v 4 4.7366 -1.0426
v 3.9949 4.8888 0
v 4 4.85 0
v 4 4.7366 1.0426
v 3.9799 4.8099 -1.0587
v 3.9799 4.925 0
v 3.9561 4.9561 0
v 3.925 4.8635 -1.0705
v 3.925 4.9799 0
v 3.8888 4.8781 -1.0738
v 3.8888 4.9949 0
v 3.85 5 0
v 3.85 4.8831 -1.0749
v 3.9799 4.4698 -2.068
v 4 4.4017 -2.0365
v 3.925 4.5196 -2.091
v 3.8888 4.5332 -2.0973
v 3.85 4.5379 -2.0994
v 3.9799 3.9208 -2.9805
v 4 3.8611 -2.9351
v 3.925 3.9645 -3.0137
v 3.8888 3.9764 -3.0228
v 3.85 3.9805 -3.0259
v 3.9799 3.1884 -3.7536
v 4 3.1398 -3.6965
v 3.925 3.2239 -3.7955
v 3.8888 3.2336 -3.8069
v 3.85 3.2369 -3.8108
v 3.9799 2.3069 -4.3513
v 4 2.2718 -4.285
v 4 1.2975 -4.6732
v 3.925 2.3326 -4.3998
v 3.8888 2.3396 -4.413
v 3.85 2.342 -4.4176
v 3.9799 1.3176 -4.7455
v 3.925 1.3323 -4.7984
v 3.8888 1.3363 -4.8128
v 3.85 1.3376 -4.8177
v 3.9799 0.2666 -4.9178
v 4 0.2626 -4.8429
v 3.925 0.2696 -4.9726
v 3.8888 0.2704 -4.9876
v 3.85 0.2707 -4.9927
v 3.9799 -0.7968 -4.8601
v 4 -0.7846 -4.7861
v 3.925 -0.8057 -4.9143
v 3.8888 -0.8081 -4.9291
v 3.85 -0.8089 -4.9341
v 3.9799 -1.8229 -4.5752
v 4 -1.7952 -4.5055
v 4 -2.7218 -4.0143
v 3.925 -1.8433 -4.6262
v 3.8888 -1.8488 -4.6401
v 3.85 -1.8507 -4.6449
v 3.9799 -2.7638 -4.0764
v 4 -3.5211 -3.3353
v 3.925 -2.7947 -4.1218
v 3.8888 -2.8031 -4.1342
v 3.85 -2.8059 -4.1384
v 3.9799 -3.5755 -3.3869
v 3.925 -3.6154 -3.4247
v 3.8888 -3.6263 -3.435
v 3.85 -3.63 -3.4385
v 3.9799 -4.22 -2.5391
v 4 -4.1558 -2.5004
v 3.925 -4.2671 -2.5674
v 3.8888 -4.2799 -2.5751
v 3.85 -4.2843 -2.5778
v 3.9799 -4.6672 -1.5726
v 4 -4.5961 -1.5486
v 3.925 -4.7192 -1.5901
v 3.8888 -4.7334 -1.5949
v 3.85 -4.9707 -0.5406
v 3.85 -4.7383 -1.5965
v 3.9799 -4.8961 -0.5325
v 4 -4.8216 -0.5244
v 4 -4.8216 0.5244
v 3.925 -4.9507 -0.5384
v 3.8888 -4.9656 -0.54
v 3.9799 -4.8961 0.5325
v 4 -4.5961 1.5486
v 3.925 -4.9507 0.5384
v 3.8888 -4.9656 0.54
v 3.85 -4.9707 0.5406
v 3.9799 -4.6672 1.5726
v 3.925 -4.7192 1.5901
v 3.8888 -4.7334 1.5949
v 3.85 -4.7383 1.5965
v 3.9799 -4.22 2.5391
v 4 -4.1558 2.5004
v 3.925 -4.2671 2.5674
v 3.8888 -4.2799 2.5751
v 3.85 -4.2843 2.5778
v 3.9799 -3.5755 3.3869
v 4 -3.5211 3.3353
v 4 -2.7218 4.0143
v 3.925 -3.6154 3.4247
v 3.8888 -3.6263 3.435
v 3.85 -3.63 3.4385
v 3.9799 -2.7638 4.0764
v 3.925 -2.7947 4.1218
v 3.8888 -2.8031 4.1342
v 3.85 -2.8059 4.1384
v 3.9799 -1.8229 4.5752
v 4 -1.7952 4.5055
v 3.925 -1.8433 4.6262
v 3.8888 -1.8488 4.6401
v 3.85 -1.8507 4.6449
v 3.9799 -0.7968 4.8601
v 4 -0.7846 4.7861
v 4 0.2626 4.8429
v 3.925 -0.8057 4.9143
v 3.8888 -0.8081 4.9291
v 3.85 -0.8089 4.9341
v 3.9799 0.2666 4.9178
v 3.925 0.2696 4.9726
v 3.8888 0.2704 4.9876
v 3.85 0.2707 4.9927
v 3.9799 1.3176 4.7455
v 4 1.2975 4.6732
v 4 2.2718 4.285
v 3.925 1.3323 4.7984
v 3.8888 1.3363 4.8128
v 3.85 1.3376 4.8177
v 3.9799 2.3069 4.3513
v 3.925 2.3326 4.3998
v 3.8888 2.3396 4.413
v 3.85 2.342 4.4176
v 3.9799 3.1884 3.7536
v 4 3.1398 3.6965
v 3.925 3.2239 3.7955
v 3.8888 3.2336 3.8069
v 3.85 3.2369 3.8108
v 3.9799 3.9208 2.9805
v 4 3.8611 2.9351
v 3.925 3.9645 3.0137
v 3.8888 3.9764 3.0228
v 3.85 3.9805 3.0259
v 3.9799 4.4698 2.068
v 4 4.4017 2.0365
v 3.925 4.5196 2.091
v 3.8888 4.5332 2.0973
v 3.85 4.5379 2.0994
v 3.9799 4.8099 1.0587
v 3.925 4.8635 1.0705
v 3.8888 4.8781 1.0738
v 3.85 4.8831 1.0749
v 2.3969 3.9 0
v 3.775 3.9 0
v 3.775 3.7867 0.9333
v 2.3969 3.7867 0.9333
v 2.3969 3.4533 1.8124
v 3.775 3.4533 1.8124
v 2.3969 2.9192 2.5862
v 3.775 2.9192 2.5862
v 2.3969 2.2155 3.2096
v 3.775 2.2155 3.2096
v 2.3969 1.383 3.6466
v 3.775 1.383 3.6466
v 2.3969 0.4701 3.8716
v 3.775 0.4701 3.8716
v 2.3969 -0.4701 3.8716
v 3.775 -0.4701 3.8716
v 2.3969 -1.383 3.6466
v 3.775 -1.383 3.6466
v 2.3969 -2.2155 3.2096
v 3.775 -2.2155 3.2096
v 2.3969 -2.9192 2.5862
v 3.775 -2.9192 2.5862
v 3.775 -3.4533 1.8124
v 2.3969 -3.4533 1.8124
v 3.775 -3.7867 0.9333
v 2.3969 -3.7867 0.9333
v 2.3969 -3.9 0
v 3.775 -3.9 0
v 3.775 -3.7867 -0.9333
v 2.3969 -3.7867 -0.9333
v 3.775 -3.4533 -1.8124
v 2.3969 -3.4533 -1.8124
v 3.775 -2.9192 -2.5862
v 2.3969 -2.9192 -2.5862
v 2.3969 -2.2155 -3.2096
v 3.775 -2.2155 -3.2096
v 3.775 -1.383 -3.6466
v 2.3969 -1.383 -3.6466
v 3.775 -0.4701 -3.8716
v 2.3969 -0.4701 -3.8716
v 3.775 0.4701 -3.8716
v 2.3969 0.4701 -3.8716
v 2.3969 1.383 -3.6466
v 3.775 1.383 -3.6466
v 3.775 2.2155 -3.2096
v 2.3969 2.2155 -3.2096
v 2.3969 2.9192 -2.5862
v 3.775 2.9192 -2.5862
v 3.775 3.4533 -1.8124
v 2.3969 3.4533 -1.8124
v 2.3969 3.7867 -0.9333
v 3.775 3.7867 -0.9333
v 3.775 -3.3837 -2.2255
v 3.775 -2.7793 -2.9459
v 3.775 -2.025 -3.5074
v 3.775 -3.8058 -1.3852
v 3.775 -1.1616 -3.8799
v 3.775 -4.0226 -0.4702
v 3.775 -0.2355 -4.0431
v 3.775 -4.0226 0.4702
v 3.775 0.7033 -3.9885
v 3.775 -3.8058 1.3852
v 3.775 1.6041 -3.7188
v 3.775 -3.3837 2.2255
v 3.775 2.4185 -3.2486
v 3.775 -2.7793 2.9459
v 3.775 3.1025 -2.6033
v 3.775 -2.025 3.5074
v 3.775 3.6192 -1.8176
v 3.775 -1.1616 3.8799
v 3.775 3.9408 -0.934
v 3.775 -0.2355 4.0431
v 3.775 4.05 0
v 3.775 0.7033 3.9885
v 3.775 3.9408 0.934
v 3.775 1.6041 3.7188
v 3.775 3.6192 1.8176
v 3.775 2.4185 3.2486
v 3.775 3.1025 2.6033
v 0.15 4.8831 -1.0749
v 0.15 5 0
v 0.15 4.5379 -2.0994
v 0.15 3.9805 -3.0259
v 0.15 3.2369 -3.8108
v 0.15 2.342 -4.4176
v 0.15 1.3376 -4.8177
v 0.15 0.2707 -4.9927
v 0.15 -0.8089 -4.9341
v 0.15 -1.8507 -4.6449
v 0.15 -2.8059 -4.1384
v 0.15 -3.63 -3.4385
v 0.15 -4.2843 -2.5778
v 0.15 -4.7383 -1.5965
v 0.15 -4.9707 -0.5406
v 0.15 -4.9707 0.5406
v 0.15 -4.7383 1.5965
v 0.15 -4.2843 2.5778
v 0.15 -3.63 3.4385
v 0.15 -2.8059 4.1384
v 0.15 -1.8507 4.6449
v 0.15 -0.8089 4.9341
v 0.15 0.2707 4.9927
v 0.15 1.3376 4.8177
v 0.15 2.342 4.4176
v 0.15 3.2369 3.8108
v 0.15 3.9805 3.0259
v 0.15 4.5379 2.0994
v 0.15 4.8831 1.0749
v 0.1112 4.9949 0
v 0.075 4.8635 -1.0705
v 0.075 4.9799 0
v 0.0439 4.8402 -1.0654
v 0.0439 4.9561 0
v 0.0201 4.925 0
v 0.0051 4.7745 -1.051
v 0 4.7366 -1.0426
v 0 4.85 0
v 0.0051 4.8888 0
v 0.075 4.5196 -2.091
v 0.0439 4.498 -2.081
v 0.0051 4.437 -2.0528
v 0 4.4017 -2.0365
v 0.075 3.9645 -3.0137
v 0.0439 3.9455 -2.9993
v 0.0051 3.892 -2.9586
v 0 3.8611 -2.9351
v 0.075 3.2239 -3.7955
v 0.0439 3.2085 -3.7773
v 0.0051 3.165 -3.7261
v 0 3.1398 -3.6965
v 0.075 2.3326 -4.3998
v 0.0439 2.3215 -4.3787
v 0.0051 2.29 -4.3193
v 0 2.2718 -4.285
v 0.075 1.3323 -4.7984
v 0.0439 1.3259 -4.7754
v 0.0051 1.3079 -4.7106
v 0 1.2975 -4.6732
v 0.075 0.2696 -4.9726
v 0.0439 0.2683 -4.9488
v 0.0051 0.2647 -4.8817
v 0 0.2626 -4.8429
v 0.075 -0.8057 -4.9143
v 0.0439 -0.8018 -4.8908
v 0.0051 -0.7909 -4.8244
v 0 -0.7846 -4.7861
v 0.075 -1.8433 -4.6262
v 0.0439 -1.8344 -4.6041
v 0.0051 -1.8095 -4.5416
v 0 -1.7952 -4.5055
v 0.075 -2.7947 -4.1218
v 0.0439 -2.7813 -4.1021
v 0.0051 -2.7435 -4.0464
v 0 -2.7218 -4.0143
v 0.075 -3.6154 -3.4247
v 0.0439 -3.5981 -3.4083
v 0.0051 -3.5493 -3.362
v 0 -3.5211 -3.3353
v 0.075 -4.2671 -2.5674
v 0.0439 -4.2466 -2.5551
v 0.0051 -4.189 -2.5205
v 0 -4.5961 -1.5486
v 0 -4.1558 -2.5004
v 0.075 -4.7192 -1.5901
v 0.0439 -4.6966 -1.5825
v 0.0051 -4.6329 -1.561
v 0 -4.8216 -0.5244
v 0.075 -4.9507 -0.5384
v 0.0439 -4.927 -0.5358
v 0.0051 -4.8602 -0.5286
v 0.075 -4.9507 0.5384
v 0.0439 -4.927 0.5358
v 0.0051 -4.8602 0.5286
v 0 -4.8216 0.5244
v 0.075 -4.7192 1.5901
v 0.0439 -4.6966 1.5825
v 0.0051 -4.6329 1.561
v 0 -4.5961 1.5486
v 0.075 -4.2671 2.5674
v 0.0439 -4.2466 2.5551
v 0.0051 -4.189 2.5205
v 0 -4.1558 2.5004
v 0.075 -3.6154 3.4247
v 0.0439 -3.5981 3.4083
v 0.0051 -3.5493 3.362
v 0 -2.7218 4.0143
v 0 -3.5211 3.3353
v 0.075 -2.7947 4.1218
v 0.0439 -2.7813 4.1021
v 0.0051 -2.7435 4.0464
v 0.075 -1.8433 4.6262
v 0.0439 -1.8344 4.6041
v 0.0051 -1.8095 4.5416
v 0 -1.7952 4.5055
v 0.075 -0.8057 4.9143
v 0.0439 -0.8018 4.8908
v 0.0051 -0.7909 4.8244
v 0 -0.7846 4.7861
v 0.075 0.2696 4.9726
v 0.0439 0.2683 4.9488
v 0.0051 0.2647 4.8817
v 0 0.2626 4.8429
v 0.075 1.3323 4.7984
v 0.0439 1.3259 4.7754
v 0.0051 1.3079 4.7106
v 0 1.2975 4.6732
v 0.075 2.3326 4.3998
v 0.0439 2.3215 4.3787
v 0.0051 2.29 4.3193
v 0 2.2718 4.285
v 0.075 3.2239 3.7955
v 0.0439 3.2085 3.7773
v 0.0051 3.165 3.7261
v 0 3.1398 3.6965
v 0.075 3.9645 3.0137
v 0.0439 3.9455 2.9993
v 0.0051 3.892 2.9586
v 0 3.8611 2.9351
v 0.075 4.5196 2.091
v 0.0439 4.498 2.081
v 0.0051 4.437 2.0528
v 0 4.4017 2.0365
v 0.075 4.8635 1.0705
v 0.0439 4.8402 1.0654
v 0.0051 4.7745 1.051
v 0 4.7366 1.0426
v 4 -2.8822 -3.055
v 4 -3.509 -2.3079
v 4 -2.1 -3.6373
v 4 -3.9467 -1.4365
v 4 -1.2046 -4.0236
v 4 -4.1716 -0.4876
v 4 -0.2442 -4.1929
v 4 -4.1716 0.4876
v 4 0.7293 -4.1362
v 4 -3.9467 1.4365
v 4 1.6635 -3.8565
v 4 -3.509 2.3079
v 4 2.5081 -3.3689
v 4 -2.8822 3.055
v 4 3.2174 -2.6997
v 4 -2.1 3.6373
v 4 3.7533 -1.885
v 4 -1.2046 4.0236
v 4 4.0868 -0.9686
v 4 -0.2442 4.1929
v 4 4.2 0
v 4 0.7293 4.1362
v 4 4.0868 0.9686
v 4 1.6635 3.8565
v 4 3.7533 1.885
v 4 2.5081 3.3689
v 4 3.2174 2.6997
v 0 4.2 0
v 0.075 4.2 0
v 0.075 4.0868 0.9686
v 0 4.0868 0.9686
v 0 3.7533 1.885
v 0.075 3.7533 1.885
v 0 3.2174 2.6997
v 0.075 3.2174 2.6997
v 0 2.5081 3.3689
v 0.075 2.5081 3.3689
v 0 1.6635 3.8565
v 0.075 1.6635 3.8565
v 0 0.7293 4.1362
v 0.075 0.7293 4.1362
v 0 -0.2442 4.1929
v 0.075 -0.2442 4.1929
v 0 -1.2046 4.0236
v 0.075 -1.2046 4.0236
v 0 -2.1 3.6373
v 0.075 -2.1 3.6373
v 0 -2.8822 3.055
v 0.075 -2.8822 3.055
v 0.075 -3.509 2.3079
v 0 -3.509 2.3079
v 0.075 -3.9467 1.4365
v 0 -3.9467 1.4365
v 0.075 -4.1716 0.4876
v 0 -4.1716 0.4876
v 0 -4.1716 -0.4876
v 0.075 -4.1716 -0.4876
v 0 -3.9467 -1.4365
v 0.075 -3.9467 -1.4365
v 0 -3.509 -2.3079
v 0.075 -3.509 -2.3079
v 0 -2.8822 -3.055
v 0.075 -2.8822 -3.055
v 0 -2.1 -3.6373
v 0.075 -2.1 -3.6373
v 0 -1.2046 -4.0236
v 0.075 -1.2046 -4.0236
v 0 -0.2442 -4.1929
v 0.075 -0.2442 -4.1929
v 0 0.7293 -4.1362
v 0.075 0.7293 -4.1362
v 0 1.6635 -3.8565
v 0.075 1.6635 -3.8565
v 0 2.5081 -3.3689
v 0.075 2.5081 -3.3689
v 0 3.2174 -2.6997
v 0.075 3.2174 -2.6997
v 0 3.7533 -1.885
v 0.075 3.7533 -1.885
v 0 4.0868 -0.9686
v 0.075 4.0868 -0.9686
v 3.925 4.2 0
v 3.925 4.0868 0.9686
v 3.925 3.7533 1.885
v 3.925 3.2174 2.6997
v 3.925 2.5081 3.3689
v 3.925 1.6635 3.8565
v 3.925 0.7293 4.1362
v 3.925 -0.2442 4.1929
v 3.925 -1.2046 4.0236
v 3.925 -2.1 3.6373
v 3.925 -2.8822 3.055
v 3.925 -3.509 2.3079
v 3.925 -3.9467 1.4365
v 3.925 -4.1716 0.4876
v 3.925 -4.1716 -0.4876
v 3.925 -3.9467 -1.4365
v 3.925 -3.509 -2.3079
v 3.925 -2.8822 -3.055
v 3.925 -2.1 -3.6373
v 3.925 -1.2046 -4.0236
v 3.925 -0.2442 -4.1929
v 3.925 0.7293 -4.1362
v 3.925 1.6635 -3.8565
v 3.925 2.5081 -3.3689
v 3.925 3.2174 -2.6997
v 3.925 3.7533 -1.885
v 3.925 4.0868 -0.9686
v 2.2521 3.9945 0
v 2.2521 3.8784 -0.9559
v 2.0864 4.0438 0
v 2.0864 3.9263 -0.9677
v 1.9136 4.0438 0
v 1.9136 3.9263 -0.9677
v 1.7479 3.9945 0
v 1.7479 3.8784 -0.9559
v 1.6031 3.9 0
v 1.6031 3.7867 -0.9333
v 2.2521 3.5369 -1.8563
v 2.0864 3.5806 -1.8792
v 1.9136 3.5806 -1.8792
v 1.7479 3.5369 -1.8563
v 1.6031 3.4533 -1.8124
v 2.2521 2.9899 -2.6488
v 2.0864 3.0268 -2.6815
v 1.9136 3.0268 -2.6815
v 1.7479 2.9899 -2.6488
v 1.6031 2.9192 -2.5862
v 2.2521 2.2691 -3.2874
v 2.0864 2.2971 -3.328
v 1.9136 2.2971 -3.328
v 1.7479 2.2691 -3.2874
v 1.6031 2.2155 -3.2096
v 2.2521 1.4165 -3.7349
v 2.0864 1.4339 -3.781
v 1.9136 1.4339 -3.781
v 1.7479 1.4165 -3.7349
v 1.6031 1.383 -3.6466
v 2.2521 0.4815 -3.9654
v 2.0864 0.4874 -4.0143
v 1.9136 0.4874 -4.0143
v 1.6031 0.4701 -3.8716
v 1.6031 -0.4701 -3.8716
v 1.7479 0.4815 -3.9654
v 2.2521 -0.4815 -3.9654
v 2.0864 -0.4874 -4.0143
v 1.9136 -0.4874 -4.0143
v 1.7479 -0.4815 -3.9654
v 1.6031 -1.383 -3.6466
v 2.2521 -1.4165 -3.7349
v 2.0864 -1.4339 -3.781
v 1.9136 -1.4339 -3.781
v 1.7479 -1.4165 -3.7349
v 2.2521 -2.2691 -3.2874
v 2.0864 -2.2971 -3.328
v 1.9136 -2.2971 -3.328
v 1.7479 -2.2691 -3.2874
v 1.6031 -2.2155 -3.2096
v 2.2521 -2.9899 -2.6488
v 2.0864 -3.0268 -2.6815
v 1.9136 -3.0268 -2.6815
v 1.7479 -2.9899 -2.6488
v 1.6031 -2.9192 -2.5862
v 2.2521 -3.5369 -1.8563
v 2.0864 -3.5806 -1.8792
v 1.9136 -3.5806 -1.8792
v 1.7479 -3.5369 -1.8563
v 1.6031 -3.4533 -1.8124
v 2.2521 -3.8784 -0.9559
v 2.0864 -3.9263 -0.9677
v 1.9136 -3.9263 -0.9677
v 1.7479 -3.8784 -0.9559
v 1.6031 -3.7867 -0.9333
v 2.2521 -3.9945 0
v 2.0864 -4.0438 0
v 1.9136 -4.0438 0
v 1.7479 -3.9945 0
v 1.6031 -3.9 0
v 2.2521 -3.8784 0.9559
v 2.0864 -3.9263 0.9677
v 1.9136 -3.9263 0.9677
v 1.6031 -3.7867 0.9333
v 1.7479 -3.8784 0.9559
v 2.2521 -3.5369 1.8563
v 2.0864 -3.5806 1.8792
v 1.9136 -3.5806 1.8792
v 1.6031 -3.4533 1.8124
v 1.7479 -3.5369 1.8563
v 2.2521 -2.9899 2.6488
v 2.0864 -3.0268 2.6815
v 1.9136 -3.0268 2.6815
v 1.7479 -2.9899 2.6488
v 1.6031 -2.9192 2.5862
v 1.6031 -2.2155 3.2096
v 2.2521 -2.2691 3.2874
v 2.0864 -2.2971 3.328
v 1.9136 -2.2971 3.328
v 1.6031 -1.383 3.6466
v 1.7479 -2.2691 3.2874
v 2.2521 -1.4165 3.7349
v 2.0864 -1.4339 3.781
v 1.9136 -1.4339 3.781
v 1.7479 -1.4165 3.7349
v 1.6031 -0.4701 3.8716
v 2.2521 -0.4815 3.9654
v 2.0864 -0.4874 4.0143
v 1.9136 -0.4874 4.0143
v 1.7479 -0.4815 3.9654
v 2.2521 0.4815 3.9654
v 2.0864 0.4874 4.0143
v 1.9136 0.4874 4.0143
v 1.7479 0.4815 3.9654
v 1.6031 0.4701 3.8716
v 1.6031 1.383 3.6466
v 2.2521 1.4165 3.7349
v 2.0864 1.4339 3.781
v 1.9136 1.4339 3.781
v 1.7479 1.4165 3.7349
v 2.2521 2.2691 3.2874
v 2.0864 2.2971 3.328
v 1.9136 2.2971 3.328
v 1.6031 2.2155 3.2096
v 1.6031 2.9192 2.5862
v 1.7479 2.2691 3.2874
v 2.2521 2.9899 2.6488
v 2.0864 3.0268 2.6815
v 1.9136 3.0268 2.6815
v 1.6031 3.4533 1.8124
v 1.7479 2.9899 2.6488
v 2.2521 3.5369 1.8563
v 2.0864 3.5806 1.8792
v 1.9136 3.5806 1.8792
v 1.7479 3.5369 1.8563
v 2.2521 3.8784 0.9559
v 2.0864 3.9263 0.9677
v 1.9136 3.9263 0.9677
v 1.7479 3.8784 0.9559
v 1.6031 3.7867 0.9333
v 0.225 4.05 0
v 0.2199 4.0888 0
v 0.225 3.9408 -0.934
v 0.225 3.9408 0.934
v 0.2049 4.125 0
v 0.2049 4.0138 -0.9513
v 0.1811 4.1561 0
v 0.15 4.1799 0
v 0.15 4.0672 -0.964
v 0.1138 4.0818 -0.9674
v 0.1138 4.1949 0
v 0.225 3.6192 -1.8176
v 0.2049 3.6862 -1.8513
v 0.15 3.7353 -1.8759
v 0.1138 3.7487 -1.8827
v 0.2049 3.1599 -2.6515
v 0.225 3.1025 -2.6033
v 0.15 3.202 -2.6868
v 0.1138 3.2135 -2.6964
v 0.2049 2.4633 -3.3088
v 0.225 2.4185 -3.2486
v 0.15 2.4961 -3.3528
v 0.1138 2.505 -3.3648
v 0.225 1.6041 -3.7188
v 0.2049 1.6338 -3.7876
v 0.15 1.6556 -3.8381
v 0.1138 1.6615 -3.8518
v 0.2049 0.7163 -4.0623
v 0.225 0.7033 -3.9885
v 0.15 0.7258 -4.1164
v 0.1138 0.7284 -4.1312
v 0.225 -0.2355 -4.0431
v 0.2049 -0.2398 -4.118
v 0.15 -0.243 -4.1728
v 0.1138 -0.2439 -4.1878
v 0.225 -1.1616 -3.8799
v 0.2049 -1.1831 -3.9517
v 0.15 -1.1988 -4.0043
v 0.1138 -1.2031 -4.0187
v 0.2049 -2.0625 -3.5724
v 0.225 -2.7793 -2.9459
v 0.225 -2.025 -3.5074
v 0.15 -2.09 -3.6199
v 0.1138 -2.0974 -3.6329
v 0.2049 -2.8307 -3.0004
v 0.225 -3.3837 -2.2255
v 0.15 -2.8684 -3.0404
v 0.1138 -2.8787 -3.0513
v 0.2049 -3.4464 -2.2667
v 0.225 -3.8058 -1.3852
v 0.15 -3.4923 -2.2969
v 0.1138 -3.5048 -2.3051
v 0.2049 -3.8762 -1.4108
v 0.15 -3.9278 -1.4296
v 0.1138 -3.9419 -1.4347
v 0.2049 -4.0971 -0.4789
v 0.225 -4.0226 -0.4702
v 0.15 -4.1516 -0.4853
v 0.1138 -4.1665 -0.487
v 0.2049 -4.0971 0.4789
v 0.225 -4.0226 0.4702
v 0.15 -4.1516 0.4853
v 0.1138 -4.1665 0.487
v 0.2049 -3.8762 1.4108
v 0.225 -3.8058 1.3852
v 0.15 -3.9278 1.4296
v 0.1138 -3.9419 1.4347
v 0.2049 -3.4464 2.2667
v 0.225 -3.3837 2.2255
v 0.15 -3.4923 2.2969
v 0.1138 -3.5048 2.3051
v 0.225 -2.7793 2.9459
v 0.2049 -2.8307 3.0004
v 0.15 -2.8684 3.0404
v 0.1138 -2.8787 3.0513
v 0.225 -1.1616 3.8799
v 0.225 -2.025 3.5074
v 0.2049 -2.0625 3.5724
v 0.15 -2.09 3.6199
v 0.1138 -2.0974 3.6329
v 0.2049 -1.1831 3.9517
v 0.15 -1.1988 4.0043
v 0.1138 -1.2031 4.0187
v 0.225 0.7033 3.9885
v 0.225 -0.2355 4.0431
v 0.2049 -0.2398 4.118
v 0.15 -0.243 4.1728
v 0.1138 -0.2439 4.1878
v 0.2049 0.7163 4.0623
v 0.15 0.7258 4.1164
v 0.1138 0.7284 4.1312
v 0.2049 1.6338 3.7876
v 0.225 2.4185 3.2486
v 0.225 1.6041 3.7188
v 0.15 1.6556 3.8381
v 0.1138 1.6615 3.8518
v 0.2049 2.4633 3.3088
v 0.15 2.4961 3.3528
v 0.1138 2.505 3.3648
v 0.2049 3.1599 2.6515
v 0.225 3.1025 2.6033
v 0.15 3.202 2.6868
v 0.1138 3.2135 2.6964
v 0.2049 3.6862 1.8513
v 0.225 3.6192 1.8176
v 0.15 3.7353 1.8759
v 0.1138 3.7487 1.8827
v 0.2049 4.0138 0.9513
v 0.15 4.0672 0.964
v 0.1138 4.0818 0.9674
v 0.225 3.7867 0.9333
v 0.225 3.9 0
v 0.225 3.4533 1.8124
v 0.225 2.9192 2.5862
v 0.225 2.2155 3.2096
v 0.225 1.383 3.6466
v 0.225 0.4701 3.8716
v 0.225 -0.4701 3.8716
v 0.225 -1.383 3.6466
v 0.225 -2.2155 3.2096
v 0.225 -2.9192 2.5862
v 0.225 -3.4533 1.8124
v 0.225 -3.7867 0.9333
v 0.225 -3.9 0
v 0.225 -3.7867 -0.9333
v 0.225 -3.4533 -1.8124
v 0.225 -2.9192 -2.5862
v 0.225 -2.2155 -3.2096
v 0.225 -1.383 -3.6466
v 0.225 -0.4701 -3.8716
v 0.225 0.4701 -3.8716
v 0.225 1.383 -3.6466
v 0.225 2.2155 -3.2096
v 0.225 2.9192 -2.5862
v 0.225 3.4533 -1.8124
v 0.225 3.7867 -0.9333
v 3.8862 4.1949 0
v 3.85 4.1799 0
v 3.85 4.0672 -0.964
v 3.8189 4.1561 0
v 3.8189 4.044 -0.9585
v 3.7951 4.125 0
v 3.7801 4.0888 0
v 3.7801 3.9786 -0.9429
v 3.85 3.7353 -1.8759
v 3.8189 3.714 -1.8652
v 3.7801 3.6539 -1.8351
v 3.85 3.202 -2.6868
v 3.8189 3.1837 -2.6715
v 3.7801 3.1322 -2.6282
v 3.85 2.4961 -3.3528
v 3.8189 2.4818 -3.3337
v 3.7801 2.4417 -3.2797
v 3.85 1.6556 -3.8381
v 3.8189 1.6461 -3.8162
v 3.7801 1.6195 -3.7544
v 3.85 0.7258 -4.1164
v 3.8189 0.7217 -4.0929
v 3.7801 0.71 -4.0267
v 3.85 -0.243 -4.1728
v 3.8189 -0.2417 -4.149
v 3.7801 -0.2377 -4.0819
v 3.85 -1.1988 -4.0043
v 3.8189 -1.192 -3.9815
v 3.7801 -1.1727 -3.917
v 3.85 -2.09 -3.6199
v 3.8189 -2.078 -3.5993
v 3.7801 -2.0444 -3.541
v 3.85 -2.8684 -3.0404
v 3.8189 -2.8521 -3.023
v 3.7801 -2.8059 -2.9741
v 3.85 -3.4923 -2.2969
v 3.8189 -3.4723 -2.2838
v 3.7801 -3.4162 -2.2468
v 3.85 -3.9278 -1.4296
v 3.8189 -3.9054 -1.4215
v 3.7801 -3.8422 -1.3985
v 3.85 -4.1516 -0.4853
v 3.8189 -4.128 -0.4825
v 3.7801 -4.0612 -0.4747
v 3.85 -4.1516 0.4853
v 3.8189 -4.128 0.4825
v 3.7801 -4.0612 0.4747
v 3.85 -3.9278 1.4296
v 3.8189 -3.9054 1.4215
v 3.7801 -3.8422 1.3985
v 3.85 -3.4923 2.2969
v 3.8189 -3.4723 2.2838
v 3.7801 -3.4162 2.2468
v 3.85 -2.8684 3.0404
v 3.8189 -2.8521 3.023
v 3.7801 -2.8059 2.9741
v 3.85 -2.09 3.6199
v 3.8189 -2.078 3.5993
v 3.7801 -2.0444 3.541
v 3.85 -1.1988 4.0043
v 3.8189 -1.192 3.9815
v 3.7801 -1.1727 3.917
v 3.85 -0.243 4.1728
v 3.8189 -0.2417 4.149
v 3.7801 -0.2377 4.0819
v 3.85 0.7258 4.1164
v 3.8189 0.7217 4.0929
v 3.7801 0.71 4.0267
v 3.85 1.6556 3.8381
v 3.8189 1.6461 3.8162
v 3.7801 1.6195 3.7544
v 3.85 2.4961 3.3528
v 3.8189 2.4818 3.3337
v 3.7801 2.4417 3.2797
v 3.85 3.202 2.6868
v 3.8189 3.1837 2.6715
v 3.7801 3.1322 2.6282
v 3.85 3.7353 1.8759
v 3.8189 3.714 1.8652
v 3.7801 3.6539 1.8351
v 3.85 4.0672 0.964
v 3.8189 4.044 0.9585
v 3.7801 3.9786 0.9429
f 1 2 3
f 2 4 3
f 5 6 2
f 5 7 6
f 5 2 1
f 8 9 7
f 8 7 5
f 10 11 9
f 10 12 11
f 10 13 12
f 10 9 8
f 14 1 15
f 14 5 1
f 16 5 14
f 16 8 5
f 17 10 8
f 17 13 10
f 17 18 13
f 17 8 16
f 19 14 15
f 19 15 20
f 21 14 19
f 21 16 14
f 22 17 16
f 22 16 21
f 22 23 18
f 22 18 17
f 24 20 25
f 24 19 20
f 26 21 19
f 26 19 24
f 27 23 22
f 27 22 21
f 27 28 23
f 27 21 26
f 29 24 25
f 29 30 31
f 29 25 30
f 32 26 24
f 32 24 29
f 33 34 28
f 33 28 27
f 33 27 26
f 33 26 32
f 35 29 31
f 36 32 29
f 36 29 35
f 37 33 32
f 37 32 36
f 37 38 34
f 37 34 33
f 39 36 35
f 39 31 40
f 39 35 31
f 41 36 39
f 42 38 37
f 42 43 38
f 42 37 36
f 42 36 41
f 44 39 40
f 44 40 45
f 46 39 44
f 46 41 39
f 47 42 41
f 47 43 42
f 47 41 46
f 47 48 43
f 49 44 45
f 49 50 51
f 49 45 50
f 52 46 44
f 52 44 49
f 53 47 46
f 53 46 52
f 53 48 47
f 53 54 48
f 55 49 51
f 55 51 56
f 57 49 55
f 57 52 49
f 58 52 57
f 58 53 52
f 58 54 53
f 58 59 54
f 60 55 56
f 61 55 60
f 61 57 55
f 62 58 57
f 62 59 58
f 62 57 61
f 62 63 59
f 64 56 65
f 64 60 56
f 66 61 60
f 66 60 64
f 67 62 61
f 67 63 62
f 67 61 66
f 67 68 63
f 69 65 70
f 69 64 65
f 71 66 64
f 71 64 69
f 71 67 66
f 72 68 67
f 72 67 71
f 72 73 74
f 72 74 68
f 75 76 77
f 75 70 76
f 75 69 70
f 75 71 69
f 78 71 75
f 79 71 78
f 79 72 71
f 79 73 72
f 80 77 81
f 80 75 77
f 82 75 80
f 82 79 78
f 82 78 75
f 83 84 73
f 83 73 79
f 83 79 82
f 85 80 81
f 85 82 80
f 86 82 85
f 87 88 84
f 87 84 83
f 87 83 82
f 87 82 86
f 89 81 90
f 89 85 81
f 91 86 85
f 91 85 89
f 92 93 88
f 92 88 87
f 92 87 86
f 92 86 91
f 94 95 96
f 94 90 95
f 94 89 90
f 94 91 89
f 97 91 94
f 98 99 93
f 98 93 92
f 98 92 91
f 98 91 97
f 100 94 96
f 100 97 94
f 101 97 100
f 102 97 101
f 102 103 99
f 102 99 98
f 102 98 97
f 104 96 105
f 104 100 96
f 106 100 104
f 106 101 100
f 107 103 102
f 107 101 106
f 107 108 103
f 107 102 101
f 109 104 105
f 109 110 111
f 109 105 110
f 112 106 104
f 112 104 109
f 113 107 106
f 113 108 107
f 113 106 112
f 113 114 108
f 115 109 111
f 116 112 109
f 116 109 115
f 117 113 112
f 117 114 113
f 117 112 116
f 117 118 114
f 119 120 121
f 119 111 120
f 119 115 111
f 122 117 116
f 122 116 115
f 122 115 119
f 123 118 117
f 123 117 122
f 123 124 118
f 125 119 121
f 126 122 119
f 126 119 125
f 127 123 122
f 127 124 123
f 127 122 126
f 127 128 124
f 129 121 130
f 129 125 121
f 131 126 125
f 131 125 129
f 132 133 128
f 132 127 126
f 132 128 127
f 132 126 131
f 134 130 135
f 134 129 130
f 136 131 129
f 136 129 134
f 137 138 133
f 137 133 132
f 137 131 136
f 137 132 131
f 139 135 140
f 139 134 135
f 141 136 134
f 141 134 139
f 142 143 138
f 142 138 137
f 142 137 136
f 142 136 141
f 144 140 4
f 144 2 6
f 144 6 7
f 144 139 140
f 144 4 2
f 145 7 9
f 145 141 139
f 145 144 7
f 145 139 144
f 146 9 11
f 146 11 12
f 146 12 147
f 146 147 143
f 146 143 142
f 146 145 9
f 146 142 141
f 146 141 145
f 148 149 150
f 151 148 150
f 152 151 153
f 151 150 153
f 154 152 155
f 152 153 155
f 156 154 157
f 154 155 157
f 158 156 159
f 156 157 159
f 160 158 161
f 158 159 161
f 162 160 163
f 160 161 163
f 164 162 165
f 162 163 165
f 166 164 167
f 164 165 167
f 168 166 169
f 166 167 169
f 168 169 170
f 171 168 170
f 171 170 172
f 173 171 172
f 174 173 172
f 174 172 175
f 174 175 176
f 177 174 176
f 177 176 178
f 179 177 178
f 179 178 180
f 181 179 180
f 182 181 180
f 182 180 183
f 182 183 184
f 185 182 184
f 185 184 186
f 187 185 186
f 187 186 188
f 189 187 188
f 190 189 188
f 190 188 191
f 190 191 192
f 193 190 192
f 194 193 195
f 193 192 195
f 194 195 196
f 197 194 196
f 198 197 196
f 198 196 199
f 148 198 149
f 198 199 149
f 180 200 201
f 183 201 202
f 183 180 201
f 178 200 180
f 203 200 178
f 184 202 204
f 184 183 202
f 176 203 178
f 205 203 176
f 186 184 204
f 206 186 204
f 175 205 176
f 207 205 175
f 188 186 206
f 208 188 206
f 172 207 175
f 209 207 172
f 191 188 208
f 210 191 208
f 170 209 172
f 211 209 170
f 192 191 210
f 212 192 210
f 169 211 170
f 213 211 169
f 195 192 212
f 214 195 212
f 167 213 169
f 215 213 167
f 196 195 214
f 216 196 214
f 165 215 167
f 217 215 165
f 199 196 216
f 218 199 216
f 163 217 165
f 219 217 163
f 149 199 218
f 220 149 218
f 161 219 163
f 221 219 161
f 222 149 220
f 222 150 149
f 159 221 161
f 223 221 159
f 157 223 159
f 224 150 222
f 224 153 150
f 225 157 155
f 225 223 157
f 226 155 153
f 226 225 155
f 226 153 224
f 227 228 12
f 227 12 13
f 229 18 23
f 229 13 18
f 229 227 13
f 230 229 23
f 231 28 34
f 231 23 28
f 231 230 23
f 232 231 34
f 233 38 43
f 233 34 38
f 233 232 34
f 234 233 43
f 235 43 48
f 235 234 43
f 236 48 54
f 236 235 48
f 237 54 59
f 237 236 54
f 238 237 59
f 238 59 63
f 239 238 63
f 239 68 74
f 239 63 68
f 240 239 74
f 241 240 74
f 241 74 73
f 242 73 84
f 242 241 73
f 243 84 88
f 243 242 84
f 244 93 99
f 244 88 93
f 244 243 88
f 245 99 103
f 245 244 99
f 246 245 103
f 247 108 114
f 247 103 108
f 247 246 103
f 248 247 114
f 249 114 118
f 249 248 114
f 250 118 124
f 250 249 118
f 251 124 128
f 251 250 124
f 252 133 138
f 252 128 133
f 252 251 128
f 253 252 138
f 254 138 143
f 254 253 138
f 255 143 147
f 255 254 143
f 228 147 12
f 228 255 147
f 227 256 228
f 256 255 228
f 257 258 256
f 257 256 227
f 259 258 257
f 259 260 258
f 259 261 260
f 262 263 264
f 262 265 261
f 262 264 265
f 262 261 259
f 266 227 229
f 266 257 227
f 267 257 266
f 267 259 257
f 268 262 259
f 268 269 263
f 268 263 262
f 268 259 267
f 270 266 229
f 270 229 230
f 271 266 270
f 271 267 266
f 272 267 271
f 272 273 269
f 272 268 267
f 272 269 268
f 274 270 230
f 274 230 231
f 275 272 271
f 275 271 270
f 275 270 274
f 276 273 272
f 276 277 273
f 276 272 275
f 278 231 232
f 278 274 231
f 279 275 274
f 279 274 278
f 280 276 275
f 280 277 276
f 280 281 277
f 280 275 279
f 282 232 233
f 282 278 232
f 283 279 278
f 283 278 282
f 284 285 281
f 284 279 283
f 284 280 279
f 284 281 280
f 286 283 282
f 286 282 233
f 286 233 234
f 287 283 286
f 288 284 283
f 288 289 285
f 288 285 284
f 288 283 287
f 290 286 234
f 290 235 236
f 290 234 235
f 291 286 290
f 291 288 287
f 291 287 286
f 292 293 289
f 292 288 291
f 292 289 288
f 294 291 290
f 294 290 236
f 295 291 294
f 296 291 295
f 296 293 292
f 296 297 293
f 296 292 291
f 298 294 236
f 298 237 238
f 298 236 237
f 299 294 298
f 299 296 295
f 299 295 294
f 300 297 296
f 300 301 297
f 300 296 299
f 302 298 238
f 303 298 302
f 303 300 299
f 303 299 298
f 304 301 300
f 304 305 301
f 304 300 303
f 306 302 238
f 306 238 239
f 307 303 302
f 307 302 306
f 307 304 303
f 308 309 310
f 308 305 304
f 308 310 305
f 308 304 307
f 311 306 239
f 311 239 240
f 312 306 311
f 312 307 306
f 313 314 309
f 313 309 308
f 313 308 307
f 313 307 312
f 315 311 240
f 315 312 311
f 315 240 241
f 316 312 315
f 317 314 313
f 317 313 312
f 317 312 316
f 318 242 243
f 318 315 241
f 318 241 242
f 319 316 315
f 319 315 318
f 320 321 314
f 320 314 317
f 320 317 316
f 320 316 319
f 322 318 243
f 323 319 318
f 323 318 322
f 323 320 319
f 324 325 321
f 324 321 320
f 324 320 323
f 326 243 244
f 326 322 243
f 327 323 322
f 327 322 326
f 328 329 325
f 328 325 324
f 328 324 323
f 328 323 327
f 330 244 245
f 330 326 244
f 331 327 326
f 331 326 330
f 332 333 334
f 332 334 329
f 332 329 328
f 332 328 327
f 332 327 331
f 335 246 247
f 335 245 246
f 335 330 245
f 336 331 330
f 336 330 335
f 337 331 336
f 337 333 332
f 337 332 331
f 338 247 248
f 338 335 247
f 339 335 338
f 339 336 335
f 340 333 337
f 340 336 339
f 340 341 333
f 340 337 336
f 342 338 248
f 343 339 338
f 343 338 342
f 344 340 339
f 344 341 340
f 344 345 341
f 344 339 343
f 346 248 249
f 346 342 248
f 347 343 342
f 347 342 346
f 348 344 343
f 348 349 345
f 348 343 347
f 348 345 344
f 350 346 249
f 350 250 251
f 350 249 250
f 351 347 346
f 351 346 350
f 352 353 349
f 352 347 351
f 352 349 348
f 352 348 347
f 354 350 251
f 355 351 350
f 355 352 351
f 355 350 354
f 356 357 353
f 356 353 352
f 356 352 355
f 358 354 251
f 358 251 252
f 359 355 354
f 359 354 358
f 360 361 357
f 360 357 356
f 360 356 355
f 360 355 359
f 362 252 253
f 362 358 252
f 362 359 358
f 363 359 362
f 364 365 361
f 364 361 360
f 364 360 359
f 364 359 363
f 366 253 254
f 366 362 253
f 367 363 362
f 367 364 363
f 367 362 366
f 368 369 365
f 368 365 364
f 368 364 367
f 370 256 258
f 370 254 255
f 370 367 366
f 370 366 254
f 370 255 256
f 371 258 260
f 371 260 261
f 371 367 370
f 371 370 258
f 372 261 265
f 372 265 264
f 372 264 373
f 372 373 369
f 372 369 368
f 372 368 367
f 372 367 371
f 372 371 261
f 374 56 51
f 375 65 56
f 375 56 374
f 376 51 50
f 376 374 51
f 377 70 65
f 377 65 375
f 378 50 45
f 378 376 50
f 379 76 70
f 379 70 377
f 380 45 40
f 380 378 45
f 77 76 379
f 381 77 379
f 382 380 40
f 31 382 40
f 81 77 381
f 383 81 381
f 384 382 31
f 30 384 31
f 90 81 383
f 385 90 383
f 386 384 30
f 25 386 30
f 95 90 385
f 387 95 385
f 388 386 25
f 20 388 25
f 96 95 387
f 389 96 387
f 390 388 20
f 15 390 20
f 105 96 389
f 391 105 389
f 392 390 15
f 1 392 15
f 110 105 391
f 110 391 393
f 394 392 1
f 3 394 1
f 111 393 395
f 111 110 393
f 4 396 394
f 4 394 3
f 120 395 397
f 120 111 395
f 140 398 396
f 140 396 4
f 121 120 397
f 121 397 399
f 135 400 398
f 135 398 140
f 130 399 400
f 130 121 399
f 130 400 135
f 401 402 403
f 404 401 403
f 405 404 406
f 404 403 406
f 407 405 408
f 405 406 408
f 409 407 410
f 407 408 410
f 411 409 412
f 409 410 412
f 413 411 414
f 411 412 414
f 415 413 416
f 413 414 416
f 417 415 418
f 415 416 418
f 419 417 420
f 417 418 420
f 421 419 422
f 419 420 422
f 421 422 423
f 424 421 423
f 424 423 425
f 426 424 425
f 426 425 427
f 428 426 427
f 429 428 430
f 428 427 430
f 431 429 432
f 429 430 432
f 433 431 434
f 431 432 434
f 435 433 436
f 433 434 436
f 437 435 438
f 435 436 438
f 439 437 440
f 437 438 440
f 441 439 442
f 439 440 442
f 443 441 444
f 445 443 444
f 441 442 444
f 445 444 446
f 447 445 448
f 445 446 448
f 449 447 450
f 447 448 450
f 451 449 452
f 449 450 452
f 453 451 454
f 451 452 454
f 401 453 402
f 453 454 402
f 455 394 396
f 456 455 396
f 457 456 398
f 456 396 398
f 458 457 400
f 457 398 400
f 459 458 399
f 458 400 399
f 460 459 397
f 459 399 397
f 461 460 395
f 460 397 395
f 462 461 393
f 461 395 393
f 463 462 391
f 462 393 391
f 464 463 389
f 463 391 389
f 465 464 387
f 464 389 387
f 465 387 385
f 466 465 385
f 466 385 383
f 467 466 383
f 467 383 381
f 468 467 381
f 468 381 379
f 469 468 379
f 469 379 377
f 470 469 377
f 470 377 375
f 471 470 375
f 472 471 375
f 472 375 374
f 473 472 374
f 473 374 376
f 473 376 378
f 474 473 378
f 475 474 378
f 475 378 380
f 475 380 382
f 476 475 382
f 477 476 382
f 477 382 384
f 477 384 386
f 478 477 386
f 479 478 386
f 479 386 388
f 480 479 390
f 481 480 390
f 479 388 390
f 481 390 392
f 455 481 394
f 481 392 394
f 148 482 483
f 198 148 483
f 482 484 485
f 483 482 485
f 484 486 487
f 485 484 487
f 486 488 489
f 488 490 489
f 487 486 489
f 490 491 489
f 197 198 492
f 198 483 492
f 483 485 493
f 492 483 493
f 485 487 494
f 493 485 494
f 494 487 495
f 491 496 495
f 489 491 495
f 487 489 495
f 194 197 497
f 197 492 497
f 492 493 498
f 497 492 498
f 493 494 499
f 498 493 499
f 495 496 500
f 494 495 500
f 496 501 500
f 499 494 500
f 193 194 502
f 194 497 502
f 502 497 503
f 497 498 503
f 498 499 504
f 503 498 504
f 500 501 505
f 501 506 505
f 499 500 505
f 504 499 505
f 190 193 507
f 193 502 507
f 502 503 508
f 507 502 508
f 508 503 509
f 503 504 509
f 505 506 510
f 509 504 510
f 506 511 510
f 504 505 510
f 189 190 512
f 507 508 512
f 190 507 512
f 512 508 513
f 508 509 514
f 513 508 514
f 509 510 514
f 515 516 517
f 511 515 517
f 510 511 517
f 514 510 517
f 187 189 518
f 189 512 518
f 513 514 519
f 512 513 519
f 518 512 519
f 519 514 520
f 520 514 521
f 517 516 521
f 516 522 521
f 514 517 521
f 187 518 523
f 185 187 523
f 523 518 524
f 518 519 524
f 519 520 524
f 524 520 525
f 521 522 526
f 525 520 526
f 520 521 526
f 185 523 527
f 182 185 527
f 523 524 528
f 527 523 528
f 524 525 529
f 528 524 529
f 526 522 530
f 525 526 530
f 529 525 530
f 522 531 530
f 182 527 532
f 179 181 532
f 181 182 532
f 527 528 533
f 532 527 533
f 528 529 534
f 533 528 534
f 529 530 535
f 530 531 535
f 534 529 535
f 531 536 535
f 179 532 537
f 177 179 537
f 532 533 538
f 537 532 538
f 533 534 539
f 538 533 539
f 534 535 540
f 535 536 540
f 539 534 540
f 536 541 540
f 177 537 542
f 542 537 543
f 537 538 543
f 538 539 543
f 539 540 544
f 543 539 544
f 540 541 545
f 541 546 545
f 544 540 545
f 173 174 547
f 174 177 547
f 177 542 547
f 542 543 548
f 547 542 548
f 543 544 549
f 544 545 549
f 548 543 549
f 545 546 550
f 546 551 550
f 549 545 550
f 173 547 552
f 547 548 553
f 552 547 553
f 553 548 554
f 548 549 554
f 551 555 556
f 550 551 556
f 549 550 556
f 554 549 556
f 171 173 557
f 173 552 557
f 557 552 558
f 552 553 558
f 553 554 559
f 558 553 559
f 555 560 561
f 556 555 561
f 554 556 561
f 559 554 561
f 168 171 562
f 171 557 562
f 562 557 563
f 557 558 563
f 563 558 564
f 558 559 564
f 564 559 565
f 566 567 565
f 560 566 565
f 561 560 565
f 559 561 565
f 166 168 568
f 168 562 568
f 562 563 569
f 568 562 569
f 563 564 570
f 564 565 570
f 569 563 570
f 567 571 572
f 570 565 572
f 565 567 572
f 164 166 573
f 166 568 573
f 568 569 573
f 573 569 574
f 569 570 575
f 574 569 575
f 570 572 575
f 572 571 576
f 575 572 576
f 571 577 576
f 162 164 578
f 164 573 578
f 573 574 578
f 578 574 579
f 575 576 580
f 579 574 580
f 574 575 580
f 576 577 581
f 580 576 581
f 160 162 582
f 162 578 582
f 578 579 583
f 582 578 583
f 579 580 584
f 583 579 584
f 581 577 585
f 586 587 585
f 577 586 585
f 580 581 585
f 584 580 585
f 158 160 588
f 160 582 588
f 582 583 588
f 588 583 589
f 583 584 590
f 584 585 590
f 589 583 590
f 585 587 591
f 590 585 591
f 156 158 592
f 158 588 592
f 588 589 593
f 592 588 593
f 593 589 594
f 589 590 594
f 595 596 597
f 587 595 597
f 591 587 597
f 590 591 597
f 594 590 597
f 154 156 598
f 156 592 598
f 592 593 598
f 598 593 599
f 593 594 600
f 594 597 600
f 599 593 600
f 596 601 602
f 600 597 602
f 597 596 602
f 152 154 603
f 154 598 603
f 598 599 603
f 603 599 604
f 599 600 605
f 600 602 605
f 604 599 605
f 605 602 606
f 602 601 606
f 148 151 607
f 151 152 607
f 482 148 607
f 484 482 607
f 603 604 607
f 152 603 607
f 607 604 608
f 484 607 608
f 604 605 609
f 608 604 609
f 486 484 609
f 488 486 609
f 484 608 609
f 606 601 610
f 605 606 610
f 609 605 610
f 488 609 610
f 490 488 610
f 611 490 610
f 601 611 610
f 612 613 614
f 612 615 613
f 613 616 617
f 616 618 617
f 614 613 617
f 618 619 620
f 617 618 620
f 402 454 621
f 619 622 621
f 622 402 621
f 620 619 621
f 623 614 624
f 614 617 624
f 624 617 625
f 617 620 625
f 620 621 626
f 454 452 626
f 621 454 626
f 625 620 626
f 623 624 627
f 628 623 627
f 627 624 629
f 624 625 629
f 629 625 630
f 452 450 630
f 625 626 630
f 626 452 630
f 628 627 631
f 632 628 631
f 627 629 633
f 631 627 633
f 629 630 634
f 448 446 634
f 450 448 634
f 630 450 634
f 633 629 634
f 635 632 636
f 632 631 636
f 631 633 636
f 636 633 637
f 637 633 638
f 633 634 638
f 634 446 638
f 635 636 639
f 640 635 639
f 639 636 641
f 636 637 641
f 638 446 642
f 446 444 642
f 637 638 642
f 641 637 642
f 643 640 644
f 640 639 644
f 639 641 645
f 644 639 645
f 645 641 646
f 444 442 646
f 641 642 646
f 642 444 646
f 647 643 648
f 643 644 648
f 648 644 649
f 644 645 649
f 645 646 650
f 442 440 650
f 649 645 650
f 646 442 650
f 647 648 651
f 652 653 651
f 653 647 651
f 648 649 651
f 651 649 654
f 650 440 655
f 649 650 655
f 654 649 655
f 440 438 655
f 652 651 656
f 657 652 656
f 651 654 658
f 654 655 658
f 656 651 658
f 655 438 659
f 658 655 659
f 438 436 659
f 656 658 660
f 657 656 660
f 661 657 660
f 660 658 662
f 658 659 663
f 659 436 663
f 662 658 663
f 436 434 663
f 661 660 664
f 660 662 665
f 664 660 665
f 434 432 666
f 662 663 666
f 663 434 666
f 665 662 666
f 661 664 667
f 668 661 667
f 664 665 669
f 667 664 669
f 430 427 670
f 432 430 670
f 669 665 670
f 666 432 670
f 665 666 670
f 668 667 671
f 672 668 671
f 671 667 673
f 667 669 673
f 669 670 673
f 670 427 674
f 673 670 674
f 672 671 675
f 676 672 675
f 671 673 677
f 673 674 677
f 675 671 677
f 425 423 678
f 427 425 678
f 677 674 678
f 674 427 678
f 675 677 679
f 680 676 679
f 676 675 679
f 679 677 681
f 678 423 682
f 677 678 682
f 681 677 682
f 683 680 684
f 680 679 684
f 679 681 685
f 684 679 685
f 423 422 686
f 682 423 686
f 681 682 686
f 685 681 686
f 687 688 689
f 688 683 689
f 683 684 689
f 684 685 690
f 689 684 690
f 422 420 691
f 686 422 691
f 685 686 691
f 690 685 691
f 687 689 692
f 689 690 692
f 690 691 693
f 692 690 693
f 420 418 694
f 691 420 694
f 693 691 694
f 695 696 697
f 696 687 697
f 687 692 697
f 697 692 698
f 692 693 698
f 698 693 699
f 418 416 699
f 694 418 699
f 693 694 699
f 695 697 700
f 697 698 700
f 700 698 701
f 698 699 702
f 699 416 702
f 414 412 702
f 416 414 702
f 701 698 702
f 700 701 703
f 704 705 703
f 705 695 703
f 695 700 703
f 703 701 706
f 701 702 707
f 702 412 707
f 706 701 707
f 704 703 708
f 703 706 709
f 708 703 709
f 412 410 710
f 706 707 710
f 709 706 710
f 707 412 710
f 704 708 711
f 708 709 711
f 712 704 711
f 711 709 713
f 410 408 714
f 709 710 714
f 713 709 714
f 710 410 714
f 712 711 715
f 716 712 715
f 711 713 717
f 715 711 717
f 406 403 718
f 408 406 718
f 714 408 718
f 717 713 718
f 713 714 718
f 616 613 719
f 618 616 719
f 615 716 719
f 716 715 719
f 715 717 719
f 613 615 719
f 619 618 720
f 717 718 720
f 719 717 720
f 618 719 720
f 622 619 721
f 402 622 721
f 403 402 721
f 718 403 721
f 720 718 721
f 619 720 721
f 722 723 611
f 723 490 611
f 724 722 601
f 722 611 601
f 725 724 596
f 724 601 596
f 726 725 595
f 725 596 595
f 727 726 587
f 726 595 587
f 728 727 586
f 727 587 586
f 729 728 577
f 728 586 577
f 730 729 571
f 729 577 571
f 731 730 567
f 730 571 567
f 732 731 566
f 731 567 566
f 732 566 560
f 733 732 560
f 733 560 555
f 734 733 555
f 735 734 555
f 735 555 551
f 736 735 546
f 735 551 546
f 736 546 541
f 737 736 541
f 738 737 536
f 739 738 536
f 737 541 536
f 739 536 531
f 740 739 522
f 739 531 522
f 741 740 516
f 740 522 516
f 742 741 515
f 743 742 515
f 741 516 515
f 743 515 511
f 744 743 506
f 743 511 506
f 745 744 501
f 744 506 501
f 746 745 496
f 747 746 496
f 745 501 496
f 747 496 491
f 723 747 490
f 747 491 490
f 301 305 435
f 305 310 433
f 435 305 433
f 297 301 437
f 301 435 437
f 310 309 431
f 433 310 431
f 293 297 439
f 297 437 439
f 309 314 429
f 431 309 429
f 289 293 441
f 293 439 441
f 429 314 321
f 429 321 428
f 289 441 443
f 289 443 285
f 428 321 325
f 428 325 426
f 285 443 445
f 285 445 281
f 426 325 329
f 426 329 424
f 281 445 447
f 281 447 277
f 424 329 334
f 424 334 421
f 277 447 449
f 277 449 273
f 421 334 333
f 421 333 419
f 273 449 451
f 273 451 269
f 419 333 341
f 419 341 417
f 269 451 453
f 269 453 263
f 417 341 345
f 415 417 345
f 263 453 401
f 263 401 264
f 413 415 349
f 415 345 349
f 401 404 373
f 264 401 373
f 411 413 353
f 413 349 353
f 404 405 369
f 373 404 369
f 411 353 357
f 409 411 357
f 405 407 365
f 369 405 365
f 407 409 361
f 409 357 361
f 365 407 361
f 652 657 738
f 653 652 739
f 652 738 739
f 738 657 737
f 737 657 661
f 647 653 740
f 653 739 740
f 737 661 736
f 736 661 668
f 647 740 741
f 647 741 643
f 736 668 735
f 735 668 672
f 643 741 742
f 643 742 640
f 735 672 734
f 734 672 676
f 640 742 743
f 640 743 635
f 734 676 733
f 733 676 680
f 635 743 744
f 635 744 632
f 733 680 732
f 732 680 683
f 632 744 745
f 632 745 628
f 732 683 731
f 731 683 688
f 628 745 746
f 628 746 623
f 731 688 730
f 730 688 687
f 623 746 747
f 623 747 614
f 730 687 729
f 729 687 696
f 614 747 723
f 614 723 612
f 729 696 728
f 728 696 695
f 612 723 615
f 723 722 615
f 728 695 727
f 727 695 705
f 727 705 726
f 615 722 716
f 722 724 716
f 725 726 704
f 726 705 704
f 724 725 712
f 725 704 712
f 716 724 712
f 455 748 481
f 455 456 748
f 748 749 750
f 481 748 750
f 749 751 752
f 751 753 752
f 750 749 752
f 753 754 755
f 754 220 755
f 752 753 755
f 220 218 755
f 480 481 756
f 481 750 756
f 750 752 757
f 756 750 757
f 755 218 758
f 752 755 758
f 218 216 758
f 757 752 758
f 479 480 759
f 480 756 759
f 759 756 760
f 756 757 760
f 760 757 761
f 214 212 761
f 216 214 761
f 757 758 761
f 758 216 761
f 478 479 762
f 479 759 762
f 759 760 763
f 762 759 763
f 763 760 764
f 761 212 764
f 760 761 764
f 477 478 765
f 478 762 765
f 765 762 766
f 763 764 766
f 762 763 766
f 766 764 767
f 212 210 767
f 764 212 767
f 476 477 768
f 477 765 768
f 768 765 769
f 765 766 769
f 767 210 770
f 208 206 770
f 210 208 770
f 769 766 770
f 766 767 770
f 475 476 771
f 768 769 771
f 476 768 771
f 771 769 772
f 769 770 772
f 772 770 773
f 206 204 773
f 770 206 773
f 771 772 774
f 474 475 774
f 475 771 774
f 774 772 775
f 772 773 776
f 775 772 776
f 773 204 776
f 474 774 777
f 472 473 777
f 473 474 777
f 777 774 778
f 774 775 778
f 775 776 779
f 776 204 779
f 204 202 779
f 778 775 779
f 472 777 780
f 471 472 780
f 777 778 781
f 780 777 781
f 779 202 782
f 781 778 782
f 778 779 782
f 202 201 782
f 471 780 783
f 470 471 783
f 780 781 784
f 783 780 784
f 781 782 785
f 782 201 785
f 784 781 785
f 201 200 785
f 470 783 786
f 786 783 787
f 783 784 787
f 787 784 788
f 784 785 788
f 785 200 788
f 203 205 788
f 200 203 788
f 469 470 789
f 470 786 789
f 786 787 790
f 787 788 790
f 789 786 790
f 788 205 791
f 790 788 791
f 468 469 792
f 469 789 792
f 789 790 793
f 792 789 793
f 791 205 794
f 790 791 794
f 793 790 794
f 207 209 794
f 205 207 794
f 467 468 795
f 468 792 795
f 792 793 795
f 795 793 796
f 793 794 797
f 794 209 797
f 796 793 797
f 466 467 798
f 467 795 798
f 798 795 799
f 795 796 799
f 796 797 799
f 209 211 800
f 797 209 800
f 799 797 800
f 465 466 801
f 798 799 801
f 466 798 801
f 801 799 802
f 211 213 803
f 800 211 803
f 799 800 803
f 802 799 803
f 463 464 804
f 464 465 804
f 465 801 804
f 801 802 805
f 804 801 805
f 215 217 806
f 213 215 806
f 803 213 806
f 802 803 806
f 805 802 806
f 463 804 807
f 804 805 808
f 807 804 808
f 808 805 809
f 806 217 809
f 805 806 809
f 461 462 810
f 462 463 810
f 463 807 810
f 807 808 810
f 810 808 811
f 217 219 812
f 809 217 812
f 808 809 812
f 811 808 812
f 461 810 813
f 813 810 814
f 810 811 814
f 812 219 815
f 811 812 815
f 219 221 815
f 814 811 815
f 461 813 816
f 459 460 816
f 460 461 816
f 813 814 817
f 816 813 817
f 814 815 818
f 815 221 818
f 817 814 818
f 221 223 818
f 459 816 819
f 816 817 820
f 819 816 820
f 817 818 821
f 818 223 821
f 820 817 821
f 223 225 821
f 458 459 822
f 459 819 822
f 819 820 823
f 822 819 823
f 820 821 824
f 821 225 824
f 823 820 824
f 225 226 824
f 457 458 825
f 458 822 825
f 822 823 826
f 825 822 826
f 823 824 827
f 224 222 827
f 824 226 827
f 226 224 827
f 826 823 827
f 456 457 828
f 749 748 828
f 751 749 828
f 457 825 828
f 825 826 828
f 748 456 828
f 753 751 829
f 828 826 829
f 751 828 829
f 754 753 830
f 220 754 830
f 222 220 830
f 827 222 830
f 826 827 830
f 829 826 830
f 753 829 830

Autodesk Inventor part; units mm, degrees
sketch "Sketch_9" plane through (0, 0, 0) normal (0, 0, 1) x (1, 0, 0)
  line L0 (50, 0) -> (-50, 0)
  line L1 (0, 4.85) -> (0, 4.2)
  line L2 (0, 4.2) -> (0.075, 4.2)
  arc A0 (0.225, 4.05) -> (0.075, 4.2) centre (0.075, 4.05) ccw
  line L3 (0.225, 4.05) -> (0.225, 3.9)
  line L4 (0.225, 3.9) -> (1.6031, 3.9)
  arc A1 (2.3969, 3.9) -> (1.6031, 3.9) centre (2, 3.45) ccw
  line L5 (2.3969, 3.9) -> (3.775, 3.9)
  line L6 (3.775, 3.9) -> (3.775, 4.05)
  arc A2 (3.925, 4.2) -> (3.775, 4.05) centre (3.925, 4.05) ccw
  line L7 (3.925, 4.2) -> (4, 4.2)
  line L8 (4, 4.2) -> (4, 4.85)
  arc A3 (4, 4.85) -> (3.85, 5) centre (3.85, 4.85) ccw
  line L9 (3.85, 5) -> (0.15, 5)
  arc A4 (0.15, 5) -> (0, 4.85) centre (0.15, 4.85) ccw
revolve "Revolution1" add sketch "Sketch_9" angle 360 about axis through (50, 0, 0) along (1, 0, 0)
ref_plane "or_XY" through (0, 0, 0) normal (0, 0, 1) x (1, 0, 0)
ref_plane "or_YZ" through (0, 0, 0) normal (1, 0, 0) x (0, 1, 0)
ref_plane "or_ZX" through (0, 0, 0) normal (0, 1, 0) x (0, 0, 1)
properties part number "SKF_WBB1-8705-2RS1_or"
